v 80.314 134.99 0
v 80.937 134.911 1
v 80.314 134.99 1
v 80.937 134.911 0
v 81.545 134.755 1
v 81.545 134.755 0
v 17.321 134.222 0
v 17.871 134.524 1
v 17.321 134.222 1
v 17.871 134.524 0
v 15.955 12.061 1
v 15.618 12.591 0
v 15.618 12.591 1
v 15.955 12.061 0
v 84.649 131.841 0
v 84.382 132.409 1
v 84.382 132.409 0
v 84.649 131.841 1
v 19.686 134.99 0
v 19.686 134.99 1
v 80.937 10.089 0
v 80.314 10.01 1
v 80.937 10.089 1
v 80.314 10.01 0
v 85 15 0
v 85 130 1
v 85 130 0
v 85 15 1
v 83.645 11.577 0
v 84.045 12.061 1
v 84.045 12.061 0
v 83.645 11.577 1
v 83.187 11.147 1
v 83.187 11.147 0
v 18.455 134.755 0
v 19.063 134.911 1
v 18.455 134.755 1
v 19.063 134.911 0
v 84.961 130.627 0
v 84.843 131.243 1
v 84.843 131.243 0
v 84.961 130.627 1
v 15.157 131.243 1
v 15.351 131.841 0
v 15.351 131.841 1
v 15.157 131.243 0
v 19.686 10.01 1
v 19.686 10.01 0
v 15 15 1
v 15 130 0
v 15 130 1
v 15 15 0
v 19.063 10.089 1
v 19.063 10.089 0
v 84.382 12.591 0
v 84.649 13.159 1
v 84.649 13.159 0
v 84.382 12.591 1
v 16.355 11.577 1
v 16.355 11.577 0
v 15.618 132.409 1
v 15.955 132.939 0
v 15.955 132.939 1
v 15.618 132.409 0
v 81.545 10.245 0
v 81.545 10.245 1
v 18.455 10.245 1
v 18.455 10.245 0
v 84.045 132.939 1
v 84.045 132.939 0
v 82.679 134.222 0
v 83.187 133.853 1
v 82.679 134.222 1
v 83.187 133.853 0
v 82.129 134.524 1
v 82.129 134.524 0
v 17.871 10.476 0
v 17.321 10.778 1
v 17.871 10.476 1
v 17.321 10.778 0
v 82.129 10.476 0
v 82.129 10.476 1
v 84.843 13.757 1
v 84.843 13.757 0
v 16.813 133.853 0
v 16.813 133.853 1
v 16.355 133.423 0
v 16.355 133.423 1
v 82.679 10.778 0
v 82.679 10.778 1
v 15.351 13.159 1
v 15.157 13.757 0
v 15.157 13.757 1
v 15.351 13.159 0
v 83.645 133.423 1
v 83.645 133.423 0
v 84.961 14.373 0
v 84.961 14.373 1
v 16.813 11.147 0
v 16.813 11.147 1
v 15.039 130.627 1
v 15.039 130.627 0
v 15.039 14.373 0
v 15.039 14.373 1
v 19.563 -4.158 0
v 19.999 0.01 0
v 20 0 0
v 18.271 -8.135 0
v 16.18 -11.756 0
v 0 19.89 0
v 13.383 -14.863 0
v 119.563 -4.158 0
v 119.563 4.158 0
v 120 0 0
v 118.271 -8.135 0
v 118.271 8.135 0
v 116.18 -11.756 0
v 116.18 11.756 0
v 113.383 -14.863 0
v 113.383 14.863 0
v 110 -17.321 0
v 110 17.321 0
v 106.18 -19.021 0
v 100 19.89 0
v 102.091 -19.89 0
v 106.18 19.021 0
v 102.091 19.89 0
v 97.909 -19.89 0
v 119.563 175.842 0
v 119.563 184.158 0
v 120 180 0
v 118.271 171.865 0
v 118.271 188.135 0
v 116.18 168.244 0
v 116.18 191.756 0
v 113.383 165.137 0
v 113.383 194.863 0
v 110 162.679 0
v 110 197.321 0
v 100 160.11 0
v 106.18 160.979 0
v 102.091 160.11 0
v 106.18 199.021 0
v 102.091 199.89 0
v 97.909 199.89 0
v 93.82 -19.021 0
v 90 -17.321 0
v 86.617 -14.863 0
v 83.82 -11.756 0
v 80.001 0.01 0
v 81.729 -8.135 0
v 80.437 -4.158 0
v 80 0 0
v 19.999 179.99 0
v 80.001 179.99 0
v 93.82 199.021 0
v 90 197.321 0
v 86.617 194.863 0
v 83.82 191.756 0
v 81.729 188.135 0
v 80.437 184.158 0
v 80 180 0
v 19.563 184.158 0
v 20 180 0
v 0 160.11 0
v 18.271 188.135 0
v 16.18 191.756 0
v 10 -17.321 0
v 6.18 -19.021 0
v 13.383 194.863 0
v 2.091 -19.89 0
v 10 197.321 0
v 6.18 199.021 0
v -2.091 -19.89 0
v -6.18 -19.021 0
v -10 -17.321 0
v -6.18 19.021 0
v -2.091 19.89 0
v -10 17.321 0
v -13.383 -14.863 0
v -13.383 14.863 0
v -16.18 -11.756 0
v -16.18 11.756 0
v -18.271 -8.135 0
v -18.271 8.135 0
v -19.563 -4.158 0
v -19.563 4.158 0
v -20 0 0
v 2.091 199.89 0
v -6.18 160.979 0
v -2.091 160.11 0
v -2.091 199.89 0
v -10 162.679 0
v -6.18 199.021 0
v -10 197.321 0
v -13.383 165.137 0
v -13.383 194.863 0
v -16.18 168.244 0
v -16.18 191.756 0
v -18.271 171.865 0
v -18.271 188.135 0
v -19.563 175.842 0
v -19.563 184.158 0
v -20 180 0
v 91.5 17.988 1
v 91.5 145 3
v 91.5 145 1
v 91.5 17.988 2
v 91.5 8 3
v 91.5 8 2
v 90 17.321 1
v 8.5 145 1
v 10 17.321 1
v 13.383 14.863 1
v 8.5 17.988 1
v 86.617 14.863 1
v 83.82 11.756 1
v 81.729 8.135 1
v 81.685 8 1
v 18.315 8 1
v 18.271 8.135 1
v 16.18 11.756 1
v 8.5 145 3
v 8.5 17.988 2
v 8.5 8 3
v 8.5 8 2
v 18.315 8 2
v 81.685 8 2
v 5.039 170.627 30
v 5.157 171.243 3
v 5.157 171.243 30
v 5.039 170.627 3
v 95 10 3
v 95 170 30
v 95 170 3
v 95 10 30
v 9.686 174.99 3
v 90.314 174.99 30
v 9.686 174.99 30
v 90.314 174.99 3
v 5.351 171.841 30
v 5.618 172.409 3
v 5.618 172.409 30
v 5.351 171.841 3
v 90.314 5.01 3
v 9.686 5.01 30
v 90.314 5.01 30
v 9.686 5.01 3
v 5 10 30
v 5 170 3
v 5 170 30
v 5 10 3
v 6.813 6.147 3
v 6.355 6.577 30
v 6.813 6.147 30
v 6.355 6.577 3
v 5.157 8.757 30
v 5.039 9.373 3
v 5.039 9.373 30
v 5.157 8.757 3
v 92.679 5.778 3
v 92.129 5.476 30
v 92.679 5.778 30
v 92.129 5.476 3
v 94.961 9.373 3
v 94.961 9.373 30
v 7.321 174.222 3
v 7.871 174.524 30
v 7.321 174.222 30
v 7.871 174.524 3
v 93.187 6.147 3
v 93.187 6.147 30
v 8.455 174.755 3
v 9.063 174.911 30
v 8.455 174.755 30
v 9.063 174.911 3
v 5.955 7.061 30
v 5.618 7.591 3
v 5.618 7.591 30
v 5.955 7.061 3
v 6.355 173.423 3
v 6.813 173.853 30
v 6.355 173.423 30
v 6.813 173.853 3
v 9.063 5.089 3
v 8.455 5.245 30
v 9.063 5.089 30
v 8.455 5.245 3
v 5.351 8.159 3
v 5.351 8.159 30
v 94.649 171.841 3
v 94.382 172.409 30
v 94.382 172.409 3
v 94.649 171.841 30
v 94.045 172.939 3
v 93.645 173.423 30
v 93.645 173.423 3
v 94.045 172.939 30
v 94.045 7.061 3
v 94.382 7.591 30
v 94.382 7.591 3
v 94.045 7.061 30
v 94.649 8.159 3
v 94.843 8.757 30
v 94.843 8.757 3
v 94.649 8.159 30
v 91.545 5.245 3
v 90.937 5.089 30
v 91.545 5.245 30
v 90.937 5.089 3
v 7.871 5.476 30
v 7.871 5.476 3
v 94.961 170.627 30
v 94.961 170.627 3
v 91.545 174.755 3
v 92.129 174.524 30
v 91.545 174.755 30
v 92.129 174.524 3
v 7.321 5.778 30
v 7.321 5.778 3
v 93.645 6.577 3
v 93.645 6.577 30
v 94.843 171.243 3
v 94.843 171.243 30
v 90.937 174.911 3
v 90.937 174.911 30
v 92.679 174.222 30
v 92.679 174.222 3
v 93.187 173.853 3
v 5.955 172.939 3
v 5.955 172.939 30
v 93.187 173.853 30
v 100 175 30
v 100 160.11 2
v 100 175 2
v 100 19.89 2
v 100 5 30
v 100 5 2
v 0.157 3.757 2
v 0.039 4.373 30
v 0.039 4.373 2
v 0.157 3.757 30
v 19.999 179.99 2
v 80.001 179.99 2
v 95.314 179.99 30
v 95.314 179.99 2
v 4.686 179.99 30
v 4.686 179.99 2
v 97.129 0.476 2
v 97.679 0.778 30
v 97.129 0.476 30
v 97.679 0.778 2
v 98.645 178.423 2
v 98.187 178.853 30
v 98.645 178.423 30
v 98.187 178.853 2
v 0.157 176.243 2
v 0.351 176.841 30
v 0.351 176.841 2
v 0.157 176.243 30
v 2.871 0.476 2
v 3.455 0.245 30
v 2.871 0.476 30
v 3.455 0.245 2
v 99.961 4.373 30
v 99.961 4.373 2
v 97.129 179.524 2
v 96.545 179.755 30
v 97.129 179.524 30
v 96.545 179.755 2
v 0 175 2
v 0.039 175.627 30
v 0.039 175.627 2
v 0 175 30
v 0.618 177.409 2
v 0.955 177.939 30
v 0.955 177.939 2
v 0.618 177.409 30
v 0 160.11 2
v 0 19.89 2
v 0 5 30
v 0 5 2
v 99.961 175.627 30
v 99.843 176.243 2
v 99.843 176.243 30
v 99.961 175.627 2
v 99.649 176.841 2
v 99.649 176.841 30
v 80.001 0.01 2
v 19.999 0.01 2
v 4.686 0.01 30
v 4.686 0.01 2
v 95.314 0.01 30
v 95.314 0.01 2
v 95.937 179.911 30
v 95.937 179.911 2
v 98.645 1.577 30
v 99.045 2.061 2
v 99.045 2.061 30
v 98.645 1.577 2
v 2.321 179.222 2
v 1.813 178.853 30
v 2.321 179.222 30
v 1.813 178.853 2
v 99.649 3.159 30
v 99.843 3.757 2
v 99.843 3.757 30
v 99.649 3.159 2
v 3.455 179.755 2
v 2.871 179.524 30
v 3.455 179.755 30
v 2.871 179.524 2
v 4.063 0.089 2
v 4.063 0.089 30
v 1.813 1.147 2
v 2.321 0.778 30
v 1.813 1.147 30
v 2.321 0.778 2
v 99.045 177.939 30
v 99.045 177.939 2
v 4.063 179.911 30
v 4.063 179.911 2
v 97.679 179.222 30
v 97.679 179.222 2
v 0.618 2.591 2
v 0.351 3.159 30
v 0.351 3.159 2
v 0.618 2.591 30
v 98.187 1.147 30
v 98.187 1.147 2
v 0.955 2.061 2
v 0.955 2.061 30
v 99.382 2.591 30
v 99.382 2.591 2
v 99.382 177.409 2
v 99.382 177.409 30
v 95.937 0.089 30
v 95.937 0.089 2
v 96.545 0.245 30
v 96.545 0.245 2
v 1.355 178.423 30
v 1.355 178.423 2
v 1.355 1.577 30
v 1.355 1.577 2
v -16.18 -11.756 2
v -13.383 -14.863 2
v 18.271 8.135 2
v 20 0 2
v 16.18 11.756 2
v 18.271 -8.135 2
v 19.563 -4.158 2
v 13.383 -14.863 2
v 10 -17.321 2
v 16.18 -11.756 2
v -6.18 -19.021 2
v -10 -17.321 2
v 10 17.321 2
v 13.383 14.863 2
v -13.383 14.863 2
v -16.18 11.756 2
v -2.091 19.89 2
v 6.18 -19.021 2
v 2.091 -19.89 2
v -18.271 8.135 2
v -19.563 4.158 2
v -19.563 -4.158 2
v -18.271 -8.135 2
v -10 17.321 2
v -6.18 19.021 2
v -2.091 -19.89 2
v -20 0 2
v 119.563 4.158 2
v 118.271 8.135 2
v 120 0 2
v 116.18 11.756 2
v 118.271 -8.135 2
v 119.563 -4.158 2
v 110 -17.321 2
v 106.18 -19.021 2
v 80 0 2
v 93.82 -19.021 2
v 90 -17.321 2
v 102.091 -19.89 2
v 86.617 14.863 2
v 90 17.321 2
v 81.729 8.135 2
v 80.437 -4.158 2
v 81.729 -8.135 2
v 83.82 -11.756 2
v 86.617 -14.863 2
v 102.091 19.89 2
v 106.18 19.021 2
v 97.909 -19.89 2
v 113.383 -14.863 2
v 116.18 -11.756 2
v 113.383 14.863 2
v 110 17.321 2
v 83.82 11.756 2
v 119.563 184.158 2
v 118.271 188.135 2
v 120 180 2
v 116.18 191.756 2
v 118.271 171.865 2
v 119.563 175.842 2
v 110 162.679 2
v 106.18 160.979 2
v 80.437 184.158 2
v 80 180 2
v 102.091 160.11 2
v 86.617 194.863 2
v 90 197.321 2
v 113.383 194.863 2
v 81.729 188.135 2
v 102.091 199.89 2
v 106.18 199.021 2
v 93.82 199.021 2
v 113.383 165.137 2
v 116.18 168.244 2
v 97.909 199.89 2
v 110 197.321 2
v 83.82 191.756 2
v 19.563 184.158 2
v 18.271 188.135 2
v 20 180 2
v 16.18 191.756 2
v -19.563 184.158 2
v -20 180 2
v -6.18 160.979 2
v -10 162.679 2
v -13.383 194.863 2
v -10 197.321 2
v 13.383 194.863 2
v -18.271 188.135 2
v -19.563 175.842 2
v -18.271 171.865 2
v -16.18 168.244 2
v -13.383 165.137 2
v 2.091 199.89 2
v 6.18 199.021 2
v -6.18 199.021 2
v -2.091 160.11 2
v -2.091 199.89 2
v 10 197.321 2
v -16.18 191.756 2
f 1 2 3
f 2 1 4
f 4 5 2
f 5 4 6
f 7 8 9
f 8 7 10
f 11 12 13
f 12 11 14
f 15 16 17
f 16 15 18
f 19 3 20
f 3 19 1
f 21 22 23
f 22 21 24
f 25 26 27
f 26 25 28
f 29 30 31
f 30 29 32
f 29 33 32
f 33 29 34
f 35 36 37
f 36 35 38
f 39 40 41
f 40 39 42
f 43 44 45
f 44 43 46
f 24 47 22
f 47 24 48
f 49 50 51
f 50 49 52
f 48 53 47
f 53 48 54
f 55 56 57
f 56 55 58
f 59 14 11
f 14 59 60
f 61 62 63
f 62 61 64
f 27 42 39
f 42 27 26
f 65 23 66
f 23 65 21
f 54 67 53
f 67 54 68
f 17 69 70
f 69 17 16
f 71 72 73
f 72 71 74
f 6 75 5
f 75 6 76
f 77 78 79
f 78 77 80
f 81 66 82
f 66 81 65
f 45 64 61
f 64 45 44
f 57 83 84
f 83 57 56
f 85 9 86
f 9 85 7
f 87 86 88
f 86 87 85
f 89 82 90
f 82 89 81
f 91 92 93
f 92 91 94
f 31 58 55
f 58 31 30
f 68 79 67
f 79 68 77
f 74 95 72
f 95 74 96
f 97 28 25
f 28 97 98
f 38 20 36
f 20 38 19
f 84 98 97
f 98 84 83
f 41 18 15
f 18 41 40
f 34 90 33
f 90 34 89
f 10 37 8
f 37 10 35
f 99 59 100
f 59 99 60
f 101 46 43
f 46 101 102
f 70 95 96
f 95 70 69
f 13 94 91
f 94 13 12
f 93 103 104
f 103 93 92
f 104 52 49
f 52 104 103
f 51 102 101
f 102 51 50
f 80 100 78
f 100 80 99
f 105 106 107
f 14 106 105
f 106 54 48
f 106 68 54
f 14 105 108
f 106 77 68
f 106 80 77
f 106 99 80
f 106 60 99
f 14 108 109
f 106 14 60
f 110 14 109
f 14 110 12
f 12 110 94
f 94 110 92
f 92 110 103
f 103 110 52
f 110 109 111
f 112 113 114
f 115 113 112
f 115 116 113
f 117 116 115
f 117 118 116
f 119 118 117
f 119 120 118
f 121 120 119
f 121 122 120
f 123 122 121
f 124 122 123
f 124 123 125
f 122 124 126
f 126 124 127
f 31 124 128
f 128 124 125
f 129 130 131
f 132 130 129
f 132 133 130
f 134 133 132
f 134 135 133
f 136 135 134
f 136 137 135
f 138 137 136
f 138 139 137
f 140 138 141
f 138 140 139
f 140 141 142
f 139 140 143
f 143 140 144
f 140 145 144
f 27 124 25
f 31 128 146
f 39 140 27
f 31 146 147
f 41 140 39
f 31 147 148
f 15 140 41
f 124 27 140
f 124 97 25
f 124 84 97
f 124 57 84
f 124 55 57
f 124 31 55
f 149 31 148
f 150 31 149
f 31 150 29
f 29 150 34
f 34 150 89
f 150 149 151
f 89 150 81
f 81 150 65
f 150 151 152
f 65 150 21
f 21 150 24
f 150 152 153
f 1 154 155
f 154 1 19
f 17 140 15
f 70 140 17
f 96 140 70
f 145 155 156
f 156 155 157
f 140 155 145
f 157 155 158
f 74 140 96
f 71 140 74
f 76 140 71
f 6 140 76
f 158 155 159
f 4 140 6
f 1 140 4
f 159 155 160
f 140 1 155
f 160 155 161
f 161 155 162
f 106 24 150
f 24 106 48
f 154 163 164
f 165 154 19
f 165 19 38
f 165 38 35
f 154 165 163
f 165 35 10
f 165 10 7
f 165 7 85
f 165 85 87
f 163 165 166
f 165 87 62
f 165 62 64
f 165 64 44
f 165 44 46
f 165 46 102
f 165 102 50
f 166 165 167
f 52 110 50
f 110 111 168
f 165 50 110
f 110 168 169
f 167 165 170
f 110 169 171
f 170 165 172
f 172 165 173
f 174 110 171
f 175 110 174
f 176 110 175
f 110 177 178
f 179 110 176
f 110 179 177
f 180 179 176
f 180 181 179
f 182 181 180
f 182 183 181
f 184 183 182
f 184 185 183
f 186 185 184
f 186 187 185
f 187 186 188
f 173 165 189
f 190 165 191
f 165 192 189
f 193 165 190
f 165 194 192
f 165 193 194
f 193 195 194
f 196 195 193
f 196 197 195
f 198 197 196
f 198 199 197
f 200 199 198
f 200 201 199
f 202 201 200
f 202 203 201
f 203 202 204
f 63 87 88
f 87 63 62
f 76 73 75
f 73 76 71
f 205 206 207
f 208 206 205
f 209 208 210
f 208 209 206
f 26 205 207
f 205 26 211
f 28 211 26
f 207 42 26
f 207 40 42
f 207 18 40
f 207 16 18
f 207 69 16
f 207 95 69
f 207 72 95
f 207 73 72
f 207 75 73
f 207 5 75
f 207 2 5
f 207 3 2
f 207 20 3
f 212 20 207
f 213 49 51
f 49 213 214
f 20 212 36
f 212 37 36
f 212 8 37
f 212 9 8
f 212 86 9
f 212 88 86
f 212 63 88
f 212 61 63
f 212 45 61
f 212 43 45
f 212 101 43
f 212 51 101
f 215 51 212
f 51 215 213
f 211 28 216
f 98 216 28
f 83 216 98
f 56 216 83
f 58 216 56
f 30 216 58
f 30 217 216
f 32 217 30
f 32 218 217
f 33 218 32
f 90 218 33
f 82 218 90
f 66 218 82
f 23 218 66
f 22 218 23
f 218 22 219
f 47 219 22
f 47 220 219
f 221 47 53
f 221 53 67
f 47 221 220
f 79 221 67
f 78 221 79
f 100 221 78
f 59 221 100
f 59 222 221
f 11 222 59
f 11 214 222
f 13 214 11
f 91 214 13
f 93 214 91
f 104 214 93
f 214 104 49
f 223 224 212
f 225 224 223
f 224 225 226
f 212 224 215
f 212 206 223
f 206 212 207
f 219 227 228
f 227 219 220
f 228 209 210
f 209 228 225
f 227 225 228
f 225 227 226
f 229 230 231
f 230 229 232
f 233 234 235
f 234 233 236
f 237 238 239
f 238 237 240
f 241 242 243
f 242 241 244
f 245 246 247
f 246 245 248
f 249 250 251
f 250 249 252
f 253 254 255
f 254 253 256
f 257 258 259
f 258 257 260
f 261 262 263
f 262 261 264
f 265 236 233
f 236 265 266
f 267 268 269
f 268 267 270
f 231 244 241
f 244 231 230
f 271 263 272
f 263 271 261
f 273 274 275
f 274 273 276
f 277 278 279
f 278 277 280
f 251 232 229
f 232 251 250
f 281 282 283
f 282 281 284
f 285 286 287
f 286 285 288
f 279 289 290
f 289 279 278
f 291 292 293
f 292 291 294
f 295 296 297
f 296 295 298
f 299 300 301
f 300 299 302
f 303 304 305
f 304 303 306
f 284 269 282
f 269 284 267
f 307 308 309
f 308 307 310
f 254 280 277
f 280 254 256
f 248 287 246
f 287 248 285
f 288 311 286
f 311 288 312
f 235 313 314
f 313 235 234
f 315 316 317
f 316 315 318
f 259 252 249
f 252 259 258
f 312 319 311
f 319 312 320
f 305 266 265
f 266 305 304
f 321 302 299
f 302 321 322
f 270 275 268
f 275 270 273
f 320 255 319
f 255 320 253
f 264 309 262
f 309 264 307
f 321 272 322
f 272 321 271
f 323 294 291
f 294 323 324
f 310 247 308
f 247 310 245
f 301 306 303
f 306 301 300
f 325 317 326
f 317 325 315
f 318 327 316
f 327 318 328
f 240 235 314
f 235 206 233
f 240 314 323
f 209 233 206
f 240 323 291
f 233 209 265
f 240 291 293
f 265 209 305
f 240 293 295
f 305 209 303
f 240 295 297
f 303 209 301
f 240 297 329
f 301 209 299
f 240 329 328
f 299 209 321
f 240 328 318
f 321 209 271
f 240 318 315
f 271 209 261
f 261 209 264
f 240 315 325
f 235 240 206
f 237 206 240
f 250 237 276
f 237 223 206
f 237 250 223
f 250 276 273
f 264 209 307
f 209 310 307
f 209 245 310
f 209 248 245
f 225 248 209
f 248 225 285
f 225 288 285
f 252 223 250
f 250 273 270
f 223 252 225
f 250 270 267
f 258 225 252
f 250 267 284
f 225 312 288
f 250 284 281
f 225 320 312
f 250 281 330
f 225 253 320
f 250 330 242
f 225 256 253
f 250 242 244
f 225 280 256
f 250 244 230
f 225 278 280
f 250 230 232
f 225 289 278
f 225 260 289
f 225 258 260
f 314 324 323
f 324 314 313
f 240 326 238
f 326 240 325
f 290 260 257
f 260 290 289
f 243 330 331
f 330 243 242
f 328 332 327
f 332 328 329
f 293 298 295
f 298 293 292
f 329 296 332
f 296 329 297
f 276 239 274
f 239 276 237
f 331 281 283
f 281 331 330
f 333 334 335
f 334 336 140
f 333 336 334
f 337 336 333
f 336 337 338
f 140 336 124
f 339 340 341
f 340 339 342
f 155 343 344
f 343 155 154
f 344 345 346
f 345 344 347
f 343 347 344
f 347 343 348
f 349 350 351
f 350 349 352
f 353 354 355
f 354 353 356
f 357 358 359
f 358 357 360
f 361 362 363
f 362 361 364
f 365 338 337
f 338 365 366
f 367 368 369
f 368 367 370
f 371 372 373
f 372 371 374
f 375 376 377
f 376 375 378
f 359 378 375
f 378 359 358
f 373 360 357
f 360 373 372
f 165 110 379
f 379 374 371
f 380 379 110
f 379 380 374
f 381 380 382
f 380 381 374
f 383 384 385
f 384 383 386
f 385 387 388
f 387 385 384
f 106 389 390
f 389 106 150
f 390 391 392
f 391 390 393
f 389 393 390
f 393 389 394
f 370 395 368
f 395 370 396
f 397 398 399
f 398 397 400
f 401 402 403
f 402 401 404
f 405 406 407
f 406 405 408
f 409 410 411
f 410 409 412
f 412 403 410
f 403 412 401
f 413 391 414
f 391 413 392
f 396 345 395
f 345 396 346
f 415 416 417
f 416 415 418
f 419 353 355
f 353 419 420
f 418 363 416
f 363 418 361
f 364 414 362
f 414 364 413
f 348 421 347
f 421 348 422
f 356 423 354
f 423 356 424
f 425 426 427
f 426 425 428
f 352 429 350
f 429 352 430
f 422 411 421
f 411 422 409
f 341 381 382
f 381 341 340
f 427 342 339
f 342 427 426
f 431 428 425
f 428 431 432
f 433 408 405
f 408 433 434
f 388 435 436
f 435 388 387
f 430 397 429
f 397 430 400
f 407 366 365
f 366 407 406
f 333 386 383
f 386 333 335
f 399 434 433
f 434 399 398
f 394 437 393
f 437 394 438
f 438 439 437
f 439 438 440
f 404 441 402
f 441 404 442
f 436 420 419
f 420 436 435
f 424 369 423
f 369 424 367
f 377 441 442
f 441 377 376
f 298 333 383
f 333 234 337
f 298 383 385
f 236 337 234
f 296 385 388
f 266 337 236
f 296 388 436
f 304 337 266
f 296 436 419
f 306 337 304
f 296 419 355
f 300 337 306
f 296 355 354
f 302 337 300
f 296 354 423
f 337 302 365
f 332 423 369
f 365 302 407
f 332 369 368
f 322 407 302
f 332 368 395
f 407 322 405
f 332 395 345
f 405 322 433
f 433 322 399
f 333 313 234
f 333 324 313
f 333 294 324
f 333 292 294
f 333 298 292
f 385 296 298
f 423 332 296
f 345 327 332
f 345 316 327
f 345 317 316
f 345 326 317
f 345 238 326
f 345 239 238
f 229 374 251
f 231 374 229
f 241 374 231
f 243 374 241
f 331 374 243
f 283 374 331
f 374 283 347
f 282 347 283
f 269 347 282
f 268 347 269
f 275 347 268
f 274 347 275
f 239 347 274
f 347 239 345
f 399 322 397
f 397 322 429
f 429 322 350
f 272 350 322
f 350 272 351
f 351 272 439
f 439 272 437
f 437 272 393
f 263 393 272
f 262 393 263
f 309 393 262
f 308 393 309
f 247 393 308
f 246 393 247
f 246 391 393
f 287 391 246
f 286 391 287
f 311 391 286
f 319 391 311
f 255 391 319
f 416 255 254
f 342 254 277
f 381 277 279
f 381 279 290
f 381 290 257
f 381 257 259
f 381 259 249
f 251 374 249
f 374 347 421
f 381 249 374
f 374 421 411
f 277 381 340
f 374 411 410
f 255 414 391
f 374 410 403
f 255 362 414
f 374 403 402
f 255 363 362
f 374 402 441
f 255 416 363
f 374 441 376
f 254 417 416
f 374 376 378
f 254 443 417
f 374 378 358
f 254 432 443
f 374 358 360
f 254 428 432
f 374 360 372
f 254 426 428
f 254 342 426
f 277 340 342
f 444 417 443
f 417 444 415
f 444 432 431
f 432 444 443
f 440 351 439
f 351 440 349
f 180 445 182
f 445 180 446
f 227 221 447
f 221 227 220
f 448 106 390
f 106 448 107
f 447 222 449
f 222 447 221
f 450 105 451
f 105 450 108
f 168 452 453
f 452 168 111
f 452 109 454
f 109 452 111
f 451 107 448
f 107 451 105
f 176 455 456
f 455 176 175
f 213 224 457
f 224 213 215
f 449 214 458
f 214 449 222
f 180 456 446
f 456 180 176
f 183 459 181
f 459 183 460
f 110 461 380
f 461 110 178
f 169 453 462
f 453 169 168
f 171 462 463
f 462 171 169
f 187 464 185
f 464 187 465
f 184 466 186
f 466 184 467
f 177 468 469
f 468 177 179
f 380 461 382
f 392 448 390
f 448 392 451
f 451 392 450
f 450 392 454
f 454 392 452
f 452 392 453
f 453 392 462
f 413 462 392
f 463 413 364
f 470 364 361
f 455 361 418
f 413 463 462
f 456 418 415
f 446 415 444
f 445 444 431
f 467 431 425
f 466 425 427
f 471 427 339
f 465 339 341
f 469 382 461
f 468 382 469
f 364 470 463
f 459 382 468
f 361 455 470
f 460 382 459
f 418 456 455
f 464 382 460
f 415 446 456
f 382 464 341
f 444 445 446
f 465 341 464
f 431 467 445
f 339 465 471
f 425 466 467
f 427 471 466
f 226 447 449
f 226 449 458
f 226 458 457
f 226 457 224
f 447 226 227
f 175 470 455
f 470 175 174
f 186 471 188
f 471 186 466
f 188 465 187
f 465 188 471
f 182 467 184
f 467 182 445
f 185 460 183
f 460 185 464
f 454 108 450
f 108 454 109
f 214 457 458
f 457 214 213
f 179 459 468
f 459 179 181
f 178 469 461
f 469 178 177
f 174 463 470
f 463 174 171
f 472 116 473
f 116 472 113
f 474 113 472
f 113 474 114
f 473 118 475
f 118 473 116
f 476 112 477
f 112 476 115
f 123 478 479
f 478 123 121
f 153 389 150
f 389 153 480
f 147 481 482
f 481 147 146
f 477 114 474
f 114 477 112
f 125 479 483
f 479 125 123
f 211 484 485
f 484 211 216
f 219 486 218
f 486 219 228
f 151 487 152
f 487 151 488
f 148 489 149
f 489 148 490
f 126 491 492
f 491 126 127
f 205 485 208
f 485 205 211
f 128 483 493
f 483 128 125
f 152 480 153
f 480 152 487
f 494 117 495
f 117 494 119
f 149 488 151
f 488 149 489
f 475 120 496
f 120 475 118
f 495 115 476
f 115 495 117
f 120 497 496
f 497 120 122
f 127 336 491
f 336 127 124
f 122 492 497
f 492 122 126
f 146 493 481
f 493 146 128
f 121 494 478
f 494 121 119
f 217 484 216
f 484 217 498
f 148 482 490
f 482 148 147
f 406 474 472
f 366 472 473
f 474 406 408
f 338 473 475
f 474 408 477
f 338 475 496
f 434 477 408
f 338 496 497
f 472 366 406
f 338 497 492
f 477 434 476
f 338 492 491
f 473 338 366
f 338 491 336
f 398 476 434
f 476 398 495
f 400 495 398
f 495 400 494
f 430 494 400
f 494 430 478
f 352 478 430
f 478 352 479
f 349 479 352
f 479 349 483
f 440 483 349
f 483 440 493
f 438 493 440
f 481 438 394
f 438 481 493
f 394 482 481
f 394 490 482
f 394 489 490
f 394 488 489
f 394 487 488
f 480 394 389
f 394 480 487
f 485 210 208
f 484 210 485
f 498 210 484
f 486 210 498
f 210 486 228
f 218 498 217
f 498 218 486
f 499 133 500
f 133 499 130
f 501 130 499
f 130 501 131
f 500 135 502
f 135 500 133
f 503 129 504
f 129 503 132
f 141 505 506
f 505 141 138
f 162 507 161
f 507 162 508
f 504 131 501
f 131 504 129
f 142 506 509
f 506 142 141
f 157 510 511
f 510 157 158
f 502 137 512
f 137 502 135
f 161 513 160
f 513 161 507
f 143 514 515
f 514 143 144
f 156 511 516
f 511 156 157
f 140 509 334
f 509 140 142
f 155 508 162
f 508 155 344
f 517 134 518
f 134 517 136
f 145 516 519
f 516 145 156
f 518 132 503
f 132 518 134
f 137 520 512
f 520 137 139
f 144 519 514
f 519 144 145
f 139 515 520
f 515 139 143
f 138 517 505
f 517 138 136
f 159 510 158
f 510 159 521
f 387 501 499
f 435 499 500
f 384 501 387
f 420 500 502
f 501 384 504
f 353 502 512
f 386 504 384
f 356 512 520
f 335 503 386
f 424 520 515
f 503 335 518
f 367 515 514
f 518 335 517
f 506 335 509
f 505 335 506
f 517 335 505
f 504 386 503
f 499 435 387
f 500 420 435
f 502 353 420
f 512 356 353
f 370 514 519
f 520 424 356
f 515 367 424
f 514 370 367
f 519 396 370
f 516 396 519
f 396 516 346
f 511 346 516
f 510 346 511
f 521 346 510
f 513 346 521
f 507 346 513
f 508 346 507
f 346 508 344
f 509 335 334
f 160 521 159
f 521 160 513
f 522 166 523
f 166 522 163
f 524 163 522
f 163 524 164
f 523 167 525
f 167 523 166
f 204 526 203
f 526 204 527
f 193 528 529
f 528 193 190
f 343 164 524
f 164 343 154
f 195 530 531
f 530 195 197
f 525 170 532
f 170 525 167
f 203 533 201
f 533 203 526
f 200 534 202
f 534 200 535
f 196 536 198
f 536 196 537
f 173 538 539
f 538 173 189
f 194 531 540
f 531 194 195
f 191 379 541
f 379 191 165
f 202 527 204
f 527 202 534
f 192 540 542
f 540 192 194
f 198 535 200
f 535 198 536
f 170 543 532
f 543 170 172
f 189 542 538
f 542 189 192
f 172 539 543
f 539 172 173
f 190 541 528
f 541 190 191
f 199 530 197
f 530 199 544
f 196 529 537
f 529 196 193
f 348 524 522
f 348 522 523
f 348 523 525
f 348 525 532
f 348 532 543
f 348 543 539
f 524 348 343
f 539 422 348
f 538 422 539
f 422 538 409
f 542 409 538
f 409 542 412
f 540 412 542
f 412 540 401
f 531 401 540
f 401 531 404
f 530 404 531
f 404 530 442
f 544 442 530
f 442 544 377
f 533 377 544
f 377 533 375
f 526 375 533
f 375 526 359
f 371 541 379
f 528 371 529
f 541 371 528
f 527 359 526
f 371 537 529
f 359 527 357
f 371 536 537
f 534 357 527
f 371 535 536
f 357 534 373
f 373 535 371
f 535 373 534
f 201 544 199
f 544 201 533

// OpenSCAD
use <MCAD/boxes.scad>

// Overall size
height = 180;
width = 100;

// Same thing?
outerWallWidth = 5;
bezelSize = 5;

// How thick the front panel should be (where the solar panel isn't mounted)
frontPanelThickness = 3;
// The height of the front (top) panel
frontPanelHeight = 15;

// Solar Panel actual outside width is 137x81
solarPanelHeight = 137;
solarPanelWidth = 83;
solarPanelDepth = 3;

// Solar panel inner exposed user contact: 125x70
solarPanelDisplayHeight = 125;
solarPanelDisplayWidth = 70;

// Switch size (physical size of the light switch being covered)
switchHeight = 88;
switchWidth = 88;
switchDepth = 22;
// How much the switch body should overlap onto the base
switchOverlap = 5;

middleDepth = 10;

module GenericBase(xDistance, yDistance, zHeight) {
	//roundedBox([xDistance, yDistance, zHeight], 2, true);

	// Create a rectangluar base to work from that
	// is xDistance by yDistance and zHeight height.

	// This is effectivly a cube with rounded corners

	// extend the base out by 3.5 from holes by using minkowski
	// which gives rounded corners to the board in the process
	// matching the Gadgeteer design
	
	$fn=50;
	radius = bezelSize;

	translate([radius,radius,0]) {
		minkowski()
		{
			cube([xDistance-(radius*2), yDistance-(radius*2), zHeight]);
			cylinder(r=radius,h=zHeight);
		}
	}
}

module SeedStalkerCutout() {
	// Position so that it is in the middle of the width
	// even though that only leaves about 1mm bexel at that point.
	// and the full bexel height from the bottom.
	translate([(width - 93) /2,(height - bezelSize) -65,0])
		cube([93,65,30]);

	// TODO: Add mounting pins and spacer
	// Add battery mount.
}

// Build up an inner wall on the base to mate with the top/middle.
module InnerWall() {
	innerWallOutsideWidth = width- (2*bezelSize);
	innerWallOutsideHeight = height-(2*bezelSize);
	wallThickness=1;

	translate([bezelSize, bezelSize, 0])  {
		difference() {
			union() 
			{
				// An inner area. remove 0.1mm to allow for a smooth fit
				GenericBase(innerWallOutsideWidth-0.1, innerWallOutsideHeight-0.1, 3);
			}		
			union() 
			{
				// Cut out the bulk of the inside of the box.
				translate([wallThickness, wallThickness, 1])  {
					GenericBase(innerWallOutsideWidth- (wallThickness*2), 
									innerWallOutsideHeight- (wallThickness*2), 
									15);
				}
			}
		}
	}
}

module SwitchCutout() {

	// Cutout smaller than the actual switch to allow for the overlap all around
	cutoutWidth = switchWidth - (switchOverlap*2);
	cutoutHeight = switchHeight - (switchOverlap*2);	

	// Padding either side of the cutout.
	paddingWidth = (width - cutoutWidth) / 2;
	paddingHeight = 15; // Fixed padding from top.

	// Switch cutout.
	// Cut out a area less wide than the switch so it sits on it 
	// keeping the box against the wall
	// -1 z to ensure it goes all the way through
	translate([paddingWidth, paddingHeight, -1]) {
				cube([cutoutWidth, cutoutHeight, 4]);
	}

	// Switch body
	// Create a block to show how the switch body sits
	// in the base.
	switchOuterPaddingWidth = (width - switchWidth) /2;
	switchOuterPaddingHeight = paddingHeight - switchOverlap;

	translate([switchOuterPaddingWidth , switchOuterPaddingHeight,1]) {
		color( [1, 0, 0, 0.90] ) {
				cube([switchWidth, switchHeight, switchDepth]);
		}
	}
}

module LightSwitchBase() {
	innerCutoutOffset = bezelSize + 2; // Wall thickness
	baseThickness = 1;

	difference() {
		union() 
		{
			// Outer base
			GenericBase(width, height, baseThickness);
		
			InnerWall();
		}		
		union() 
		{
			// Cut out the bulk of the inside of the box.
			// Outerwall padding = 5
			// Move in 5, down 5 and up 2 to provide an 
			// outline of 5x5 with 2 base.
			//translate([innerCutoutOffset, innerCutoutOffset, baseThickness])
			//	#GenericBase(width - (innerCutoutOffset * 2), 
			//						height - (innerCutoutOffset *2), 
			//						15);

			// Not used as base is 1mm thick only anyway
			// Seating area for switch to sit on
			// Create a bezeled area for the lightsitch to sit in
			// pad by 1mm as the switch is padded by 2mm.
			//translate([outerWallWidth,outerWallWidth,1])
			//	cube([switchWidth+2, switchRealHeight,1]);

			#SwitchCutout();

			//translate([0,0,2])
				//SeedStalkerCutout();
		}
	}
}

// Maybe not used...
module lightSwitchMiddle() {
	difference() {
		union() 
		{
			//cube([width,height,middleDepth]);
			GenericBase(width, height, middleDepth);
		}	
		union() 
		{
			// Cut out the bulk of the inside of the box.
			// Outerwall padding = 5
			// Move in 5, down 5 and up 1 to provide an 
			// outline of 5x5 with 1 base.
			translate([outerWallWidth, outerWallWidth,0])
				#GenericBase(width-(outerWallWidth*2), 
								height-(outerWallWidth*2), 
								middleDepth+1);
			
		}
	}
}

// Hollow out the bulk of the body.
module HollowOutBody() {

	// Move in by [bezelSize]
	translate([bezelSize,bezelSize, frontPanelThickness]) {
		GenericBase(width-(bezelSize*2), height-(bezelSize*2), frontPanelHeight +1);
	}
}

module SolarPanelCutout() {
	// Cutout for the solar panel
	// Move in, down
	// to make a window in the panel for the solar
	// panel.

	// Compute how much padding either side of the panel there
	// needs to be for it to be centered.
	paddingWidth = (width - solarPanelDisplayWidth) / 2;
	paddingTop = 10;

	// center the panel in the x.
	// leave small space at the top to make it nice with a fat bottom.
	translate([paddingWidth, paddingTop, 0]) {
		GenericBase(solarPanelDisplayWidth, solarPanelDisplayHeight, 4);
	}

	// Move up 1mm to provide a bezel for the panel
	// leave about 2mm bezel at the top as well
	translate([(width - solarPanelWidth)/2, paddingTop-2 ,1])
		cube([solarPanelWidth, solarPanelHeight,10]);

	// Replaced by HollowOutBody
	// Move up mm and cut out the rest of the area 
	// so that the solar panel has a small frame to sit in
	//translate([5,5,solarPanelDepth + 1])
	//	cube([width-10, height-10,10]);
}

module ElectronicsCutout() {
}

module LightswitchTop() {

	difference() {
		union() 
		{
			GenericBase(width, height, frontPanelHeight);
		}	

		union() 
		{
			#HollowOutBody();
			#SolarPanelCutout();
			#ElectronicsCutout();

			//translate([0,0,2])
			//	SeedStalkerCutout();
		}

	}
}

module GiveItEars() {
earSize = 20;

	translate([0,0,0]) 
		cylinder(r=earSize,h=2);

	translate([width,0,0])
		cylinder(r=earSize,h=2);

	translate([width,height,0])
		cylinder(r=earSize,h=2);

	translate([0,height,0])
		cylinder(r=earSize,h=2);
}


//LightSwitchBase();

LightswitchTop();

GiveItEars();

//translate([-(width+10),-(height +10),0])
//	lightSwitchMiddle();

rotate([0, 180,0]) {
	// Z-32 to get them on top of each other.
	translate([-width,0,-34]) {
//		LightswitchTop();
	}
}
